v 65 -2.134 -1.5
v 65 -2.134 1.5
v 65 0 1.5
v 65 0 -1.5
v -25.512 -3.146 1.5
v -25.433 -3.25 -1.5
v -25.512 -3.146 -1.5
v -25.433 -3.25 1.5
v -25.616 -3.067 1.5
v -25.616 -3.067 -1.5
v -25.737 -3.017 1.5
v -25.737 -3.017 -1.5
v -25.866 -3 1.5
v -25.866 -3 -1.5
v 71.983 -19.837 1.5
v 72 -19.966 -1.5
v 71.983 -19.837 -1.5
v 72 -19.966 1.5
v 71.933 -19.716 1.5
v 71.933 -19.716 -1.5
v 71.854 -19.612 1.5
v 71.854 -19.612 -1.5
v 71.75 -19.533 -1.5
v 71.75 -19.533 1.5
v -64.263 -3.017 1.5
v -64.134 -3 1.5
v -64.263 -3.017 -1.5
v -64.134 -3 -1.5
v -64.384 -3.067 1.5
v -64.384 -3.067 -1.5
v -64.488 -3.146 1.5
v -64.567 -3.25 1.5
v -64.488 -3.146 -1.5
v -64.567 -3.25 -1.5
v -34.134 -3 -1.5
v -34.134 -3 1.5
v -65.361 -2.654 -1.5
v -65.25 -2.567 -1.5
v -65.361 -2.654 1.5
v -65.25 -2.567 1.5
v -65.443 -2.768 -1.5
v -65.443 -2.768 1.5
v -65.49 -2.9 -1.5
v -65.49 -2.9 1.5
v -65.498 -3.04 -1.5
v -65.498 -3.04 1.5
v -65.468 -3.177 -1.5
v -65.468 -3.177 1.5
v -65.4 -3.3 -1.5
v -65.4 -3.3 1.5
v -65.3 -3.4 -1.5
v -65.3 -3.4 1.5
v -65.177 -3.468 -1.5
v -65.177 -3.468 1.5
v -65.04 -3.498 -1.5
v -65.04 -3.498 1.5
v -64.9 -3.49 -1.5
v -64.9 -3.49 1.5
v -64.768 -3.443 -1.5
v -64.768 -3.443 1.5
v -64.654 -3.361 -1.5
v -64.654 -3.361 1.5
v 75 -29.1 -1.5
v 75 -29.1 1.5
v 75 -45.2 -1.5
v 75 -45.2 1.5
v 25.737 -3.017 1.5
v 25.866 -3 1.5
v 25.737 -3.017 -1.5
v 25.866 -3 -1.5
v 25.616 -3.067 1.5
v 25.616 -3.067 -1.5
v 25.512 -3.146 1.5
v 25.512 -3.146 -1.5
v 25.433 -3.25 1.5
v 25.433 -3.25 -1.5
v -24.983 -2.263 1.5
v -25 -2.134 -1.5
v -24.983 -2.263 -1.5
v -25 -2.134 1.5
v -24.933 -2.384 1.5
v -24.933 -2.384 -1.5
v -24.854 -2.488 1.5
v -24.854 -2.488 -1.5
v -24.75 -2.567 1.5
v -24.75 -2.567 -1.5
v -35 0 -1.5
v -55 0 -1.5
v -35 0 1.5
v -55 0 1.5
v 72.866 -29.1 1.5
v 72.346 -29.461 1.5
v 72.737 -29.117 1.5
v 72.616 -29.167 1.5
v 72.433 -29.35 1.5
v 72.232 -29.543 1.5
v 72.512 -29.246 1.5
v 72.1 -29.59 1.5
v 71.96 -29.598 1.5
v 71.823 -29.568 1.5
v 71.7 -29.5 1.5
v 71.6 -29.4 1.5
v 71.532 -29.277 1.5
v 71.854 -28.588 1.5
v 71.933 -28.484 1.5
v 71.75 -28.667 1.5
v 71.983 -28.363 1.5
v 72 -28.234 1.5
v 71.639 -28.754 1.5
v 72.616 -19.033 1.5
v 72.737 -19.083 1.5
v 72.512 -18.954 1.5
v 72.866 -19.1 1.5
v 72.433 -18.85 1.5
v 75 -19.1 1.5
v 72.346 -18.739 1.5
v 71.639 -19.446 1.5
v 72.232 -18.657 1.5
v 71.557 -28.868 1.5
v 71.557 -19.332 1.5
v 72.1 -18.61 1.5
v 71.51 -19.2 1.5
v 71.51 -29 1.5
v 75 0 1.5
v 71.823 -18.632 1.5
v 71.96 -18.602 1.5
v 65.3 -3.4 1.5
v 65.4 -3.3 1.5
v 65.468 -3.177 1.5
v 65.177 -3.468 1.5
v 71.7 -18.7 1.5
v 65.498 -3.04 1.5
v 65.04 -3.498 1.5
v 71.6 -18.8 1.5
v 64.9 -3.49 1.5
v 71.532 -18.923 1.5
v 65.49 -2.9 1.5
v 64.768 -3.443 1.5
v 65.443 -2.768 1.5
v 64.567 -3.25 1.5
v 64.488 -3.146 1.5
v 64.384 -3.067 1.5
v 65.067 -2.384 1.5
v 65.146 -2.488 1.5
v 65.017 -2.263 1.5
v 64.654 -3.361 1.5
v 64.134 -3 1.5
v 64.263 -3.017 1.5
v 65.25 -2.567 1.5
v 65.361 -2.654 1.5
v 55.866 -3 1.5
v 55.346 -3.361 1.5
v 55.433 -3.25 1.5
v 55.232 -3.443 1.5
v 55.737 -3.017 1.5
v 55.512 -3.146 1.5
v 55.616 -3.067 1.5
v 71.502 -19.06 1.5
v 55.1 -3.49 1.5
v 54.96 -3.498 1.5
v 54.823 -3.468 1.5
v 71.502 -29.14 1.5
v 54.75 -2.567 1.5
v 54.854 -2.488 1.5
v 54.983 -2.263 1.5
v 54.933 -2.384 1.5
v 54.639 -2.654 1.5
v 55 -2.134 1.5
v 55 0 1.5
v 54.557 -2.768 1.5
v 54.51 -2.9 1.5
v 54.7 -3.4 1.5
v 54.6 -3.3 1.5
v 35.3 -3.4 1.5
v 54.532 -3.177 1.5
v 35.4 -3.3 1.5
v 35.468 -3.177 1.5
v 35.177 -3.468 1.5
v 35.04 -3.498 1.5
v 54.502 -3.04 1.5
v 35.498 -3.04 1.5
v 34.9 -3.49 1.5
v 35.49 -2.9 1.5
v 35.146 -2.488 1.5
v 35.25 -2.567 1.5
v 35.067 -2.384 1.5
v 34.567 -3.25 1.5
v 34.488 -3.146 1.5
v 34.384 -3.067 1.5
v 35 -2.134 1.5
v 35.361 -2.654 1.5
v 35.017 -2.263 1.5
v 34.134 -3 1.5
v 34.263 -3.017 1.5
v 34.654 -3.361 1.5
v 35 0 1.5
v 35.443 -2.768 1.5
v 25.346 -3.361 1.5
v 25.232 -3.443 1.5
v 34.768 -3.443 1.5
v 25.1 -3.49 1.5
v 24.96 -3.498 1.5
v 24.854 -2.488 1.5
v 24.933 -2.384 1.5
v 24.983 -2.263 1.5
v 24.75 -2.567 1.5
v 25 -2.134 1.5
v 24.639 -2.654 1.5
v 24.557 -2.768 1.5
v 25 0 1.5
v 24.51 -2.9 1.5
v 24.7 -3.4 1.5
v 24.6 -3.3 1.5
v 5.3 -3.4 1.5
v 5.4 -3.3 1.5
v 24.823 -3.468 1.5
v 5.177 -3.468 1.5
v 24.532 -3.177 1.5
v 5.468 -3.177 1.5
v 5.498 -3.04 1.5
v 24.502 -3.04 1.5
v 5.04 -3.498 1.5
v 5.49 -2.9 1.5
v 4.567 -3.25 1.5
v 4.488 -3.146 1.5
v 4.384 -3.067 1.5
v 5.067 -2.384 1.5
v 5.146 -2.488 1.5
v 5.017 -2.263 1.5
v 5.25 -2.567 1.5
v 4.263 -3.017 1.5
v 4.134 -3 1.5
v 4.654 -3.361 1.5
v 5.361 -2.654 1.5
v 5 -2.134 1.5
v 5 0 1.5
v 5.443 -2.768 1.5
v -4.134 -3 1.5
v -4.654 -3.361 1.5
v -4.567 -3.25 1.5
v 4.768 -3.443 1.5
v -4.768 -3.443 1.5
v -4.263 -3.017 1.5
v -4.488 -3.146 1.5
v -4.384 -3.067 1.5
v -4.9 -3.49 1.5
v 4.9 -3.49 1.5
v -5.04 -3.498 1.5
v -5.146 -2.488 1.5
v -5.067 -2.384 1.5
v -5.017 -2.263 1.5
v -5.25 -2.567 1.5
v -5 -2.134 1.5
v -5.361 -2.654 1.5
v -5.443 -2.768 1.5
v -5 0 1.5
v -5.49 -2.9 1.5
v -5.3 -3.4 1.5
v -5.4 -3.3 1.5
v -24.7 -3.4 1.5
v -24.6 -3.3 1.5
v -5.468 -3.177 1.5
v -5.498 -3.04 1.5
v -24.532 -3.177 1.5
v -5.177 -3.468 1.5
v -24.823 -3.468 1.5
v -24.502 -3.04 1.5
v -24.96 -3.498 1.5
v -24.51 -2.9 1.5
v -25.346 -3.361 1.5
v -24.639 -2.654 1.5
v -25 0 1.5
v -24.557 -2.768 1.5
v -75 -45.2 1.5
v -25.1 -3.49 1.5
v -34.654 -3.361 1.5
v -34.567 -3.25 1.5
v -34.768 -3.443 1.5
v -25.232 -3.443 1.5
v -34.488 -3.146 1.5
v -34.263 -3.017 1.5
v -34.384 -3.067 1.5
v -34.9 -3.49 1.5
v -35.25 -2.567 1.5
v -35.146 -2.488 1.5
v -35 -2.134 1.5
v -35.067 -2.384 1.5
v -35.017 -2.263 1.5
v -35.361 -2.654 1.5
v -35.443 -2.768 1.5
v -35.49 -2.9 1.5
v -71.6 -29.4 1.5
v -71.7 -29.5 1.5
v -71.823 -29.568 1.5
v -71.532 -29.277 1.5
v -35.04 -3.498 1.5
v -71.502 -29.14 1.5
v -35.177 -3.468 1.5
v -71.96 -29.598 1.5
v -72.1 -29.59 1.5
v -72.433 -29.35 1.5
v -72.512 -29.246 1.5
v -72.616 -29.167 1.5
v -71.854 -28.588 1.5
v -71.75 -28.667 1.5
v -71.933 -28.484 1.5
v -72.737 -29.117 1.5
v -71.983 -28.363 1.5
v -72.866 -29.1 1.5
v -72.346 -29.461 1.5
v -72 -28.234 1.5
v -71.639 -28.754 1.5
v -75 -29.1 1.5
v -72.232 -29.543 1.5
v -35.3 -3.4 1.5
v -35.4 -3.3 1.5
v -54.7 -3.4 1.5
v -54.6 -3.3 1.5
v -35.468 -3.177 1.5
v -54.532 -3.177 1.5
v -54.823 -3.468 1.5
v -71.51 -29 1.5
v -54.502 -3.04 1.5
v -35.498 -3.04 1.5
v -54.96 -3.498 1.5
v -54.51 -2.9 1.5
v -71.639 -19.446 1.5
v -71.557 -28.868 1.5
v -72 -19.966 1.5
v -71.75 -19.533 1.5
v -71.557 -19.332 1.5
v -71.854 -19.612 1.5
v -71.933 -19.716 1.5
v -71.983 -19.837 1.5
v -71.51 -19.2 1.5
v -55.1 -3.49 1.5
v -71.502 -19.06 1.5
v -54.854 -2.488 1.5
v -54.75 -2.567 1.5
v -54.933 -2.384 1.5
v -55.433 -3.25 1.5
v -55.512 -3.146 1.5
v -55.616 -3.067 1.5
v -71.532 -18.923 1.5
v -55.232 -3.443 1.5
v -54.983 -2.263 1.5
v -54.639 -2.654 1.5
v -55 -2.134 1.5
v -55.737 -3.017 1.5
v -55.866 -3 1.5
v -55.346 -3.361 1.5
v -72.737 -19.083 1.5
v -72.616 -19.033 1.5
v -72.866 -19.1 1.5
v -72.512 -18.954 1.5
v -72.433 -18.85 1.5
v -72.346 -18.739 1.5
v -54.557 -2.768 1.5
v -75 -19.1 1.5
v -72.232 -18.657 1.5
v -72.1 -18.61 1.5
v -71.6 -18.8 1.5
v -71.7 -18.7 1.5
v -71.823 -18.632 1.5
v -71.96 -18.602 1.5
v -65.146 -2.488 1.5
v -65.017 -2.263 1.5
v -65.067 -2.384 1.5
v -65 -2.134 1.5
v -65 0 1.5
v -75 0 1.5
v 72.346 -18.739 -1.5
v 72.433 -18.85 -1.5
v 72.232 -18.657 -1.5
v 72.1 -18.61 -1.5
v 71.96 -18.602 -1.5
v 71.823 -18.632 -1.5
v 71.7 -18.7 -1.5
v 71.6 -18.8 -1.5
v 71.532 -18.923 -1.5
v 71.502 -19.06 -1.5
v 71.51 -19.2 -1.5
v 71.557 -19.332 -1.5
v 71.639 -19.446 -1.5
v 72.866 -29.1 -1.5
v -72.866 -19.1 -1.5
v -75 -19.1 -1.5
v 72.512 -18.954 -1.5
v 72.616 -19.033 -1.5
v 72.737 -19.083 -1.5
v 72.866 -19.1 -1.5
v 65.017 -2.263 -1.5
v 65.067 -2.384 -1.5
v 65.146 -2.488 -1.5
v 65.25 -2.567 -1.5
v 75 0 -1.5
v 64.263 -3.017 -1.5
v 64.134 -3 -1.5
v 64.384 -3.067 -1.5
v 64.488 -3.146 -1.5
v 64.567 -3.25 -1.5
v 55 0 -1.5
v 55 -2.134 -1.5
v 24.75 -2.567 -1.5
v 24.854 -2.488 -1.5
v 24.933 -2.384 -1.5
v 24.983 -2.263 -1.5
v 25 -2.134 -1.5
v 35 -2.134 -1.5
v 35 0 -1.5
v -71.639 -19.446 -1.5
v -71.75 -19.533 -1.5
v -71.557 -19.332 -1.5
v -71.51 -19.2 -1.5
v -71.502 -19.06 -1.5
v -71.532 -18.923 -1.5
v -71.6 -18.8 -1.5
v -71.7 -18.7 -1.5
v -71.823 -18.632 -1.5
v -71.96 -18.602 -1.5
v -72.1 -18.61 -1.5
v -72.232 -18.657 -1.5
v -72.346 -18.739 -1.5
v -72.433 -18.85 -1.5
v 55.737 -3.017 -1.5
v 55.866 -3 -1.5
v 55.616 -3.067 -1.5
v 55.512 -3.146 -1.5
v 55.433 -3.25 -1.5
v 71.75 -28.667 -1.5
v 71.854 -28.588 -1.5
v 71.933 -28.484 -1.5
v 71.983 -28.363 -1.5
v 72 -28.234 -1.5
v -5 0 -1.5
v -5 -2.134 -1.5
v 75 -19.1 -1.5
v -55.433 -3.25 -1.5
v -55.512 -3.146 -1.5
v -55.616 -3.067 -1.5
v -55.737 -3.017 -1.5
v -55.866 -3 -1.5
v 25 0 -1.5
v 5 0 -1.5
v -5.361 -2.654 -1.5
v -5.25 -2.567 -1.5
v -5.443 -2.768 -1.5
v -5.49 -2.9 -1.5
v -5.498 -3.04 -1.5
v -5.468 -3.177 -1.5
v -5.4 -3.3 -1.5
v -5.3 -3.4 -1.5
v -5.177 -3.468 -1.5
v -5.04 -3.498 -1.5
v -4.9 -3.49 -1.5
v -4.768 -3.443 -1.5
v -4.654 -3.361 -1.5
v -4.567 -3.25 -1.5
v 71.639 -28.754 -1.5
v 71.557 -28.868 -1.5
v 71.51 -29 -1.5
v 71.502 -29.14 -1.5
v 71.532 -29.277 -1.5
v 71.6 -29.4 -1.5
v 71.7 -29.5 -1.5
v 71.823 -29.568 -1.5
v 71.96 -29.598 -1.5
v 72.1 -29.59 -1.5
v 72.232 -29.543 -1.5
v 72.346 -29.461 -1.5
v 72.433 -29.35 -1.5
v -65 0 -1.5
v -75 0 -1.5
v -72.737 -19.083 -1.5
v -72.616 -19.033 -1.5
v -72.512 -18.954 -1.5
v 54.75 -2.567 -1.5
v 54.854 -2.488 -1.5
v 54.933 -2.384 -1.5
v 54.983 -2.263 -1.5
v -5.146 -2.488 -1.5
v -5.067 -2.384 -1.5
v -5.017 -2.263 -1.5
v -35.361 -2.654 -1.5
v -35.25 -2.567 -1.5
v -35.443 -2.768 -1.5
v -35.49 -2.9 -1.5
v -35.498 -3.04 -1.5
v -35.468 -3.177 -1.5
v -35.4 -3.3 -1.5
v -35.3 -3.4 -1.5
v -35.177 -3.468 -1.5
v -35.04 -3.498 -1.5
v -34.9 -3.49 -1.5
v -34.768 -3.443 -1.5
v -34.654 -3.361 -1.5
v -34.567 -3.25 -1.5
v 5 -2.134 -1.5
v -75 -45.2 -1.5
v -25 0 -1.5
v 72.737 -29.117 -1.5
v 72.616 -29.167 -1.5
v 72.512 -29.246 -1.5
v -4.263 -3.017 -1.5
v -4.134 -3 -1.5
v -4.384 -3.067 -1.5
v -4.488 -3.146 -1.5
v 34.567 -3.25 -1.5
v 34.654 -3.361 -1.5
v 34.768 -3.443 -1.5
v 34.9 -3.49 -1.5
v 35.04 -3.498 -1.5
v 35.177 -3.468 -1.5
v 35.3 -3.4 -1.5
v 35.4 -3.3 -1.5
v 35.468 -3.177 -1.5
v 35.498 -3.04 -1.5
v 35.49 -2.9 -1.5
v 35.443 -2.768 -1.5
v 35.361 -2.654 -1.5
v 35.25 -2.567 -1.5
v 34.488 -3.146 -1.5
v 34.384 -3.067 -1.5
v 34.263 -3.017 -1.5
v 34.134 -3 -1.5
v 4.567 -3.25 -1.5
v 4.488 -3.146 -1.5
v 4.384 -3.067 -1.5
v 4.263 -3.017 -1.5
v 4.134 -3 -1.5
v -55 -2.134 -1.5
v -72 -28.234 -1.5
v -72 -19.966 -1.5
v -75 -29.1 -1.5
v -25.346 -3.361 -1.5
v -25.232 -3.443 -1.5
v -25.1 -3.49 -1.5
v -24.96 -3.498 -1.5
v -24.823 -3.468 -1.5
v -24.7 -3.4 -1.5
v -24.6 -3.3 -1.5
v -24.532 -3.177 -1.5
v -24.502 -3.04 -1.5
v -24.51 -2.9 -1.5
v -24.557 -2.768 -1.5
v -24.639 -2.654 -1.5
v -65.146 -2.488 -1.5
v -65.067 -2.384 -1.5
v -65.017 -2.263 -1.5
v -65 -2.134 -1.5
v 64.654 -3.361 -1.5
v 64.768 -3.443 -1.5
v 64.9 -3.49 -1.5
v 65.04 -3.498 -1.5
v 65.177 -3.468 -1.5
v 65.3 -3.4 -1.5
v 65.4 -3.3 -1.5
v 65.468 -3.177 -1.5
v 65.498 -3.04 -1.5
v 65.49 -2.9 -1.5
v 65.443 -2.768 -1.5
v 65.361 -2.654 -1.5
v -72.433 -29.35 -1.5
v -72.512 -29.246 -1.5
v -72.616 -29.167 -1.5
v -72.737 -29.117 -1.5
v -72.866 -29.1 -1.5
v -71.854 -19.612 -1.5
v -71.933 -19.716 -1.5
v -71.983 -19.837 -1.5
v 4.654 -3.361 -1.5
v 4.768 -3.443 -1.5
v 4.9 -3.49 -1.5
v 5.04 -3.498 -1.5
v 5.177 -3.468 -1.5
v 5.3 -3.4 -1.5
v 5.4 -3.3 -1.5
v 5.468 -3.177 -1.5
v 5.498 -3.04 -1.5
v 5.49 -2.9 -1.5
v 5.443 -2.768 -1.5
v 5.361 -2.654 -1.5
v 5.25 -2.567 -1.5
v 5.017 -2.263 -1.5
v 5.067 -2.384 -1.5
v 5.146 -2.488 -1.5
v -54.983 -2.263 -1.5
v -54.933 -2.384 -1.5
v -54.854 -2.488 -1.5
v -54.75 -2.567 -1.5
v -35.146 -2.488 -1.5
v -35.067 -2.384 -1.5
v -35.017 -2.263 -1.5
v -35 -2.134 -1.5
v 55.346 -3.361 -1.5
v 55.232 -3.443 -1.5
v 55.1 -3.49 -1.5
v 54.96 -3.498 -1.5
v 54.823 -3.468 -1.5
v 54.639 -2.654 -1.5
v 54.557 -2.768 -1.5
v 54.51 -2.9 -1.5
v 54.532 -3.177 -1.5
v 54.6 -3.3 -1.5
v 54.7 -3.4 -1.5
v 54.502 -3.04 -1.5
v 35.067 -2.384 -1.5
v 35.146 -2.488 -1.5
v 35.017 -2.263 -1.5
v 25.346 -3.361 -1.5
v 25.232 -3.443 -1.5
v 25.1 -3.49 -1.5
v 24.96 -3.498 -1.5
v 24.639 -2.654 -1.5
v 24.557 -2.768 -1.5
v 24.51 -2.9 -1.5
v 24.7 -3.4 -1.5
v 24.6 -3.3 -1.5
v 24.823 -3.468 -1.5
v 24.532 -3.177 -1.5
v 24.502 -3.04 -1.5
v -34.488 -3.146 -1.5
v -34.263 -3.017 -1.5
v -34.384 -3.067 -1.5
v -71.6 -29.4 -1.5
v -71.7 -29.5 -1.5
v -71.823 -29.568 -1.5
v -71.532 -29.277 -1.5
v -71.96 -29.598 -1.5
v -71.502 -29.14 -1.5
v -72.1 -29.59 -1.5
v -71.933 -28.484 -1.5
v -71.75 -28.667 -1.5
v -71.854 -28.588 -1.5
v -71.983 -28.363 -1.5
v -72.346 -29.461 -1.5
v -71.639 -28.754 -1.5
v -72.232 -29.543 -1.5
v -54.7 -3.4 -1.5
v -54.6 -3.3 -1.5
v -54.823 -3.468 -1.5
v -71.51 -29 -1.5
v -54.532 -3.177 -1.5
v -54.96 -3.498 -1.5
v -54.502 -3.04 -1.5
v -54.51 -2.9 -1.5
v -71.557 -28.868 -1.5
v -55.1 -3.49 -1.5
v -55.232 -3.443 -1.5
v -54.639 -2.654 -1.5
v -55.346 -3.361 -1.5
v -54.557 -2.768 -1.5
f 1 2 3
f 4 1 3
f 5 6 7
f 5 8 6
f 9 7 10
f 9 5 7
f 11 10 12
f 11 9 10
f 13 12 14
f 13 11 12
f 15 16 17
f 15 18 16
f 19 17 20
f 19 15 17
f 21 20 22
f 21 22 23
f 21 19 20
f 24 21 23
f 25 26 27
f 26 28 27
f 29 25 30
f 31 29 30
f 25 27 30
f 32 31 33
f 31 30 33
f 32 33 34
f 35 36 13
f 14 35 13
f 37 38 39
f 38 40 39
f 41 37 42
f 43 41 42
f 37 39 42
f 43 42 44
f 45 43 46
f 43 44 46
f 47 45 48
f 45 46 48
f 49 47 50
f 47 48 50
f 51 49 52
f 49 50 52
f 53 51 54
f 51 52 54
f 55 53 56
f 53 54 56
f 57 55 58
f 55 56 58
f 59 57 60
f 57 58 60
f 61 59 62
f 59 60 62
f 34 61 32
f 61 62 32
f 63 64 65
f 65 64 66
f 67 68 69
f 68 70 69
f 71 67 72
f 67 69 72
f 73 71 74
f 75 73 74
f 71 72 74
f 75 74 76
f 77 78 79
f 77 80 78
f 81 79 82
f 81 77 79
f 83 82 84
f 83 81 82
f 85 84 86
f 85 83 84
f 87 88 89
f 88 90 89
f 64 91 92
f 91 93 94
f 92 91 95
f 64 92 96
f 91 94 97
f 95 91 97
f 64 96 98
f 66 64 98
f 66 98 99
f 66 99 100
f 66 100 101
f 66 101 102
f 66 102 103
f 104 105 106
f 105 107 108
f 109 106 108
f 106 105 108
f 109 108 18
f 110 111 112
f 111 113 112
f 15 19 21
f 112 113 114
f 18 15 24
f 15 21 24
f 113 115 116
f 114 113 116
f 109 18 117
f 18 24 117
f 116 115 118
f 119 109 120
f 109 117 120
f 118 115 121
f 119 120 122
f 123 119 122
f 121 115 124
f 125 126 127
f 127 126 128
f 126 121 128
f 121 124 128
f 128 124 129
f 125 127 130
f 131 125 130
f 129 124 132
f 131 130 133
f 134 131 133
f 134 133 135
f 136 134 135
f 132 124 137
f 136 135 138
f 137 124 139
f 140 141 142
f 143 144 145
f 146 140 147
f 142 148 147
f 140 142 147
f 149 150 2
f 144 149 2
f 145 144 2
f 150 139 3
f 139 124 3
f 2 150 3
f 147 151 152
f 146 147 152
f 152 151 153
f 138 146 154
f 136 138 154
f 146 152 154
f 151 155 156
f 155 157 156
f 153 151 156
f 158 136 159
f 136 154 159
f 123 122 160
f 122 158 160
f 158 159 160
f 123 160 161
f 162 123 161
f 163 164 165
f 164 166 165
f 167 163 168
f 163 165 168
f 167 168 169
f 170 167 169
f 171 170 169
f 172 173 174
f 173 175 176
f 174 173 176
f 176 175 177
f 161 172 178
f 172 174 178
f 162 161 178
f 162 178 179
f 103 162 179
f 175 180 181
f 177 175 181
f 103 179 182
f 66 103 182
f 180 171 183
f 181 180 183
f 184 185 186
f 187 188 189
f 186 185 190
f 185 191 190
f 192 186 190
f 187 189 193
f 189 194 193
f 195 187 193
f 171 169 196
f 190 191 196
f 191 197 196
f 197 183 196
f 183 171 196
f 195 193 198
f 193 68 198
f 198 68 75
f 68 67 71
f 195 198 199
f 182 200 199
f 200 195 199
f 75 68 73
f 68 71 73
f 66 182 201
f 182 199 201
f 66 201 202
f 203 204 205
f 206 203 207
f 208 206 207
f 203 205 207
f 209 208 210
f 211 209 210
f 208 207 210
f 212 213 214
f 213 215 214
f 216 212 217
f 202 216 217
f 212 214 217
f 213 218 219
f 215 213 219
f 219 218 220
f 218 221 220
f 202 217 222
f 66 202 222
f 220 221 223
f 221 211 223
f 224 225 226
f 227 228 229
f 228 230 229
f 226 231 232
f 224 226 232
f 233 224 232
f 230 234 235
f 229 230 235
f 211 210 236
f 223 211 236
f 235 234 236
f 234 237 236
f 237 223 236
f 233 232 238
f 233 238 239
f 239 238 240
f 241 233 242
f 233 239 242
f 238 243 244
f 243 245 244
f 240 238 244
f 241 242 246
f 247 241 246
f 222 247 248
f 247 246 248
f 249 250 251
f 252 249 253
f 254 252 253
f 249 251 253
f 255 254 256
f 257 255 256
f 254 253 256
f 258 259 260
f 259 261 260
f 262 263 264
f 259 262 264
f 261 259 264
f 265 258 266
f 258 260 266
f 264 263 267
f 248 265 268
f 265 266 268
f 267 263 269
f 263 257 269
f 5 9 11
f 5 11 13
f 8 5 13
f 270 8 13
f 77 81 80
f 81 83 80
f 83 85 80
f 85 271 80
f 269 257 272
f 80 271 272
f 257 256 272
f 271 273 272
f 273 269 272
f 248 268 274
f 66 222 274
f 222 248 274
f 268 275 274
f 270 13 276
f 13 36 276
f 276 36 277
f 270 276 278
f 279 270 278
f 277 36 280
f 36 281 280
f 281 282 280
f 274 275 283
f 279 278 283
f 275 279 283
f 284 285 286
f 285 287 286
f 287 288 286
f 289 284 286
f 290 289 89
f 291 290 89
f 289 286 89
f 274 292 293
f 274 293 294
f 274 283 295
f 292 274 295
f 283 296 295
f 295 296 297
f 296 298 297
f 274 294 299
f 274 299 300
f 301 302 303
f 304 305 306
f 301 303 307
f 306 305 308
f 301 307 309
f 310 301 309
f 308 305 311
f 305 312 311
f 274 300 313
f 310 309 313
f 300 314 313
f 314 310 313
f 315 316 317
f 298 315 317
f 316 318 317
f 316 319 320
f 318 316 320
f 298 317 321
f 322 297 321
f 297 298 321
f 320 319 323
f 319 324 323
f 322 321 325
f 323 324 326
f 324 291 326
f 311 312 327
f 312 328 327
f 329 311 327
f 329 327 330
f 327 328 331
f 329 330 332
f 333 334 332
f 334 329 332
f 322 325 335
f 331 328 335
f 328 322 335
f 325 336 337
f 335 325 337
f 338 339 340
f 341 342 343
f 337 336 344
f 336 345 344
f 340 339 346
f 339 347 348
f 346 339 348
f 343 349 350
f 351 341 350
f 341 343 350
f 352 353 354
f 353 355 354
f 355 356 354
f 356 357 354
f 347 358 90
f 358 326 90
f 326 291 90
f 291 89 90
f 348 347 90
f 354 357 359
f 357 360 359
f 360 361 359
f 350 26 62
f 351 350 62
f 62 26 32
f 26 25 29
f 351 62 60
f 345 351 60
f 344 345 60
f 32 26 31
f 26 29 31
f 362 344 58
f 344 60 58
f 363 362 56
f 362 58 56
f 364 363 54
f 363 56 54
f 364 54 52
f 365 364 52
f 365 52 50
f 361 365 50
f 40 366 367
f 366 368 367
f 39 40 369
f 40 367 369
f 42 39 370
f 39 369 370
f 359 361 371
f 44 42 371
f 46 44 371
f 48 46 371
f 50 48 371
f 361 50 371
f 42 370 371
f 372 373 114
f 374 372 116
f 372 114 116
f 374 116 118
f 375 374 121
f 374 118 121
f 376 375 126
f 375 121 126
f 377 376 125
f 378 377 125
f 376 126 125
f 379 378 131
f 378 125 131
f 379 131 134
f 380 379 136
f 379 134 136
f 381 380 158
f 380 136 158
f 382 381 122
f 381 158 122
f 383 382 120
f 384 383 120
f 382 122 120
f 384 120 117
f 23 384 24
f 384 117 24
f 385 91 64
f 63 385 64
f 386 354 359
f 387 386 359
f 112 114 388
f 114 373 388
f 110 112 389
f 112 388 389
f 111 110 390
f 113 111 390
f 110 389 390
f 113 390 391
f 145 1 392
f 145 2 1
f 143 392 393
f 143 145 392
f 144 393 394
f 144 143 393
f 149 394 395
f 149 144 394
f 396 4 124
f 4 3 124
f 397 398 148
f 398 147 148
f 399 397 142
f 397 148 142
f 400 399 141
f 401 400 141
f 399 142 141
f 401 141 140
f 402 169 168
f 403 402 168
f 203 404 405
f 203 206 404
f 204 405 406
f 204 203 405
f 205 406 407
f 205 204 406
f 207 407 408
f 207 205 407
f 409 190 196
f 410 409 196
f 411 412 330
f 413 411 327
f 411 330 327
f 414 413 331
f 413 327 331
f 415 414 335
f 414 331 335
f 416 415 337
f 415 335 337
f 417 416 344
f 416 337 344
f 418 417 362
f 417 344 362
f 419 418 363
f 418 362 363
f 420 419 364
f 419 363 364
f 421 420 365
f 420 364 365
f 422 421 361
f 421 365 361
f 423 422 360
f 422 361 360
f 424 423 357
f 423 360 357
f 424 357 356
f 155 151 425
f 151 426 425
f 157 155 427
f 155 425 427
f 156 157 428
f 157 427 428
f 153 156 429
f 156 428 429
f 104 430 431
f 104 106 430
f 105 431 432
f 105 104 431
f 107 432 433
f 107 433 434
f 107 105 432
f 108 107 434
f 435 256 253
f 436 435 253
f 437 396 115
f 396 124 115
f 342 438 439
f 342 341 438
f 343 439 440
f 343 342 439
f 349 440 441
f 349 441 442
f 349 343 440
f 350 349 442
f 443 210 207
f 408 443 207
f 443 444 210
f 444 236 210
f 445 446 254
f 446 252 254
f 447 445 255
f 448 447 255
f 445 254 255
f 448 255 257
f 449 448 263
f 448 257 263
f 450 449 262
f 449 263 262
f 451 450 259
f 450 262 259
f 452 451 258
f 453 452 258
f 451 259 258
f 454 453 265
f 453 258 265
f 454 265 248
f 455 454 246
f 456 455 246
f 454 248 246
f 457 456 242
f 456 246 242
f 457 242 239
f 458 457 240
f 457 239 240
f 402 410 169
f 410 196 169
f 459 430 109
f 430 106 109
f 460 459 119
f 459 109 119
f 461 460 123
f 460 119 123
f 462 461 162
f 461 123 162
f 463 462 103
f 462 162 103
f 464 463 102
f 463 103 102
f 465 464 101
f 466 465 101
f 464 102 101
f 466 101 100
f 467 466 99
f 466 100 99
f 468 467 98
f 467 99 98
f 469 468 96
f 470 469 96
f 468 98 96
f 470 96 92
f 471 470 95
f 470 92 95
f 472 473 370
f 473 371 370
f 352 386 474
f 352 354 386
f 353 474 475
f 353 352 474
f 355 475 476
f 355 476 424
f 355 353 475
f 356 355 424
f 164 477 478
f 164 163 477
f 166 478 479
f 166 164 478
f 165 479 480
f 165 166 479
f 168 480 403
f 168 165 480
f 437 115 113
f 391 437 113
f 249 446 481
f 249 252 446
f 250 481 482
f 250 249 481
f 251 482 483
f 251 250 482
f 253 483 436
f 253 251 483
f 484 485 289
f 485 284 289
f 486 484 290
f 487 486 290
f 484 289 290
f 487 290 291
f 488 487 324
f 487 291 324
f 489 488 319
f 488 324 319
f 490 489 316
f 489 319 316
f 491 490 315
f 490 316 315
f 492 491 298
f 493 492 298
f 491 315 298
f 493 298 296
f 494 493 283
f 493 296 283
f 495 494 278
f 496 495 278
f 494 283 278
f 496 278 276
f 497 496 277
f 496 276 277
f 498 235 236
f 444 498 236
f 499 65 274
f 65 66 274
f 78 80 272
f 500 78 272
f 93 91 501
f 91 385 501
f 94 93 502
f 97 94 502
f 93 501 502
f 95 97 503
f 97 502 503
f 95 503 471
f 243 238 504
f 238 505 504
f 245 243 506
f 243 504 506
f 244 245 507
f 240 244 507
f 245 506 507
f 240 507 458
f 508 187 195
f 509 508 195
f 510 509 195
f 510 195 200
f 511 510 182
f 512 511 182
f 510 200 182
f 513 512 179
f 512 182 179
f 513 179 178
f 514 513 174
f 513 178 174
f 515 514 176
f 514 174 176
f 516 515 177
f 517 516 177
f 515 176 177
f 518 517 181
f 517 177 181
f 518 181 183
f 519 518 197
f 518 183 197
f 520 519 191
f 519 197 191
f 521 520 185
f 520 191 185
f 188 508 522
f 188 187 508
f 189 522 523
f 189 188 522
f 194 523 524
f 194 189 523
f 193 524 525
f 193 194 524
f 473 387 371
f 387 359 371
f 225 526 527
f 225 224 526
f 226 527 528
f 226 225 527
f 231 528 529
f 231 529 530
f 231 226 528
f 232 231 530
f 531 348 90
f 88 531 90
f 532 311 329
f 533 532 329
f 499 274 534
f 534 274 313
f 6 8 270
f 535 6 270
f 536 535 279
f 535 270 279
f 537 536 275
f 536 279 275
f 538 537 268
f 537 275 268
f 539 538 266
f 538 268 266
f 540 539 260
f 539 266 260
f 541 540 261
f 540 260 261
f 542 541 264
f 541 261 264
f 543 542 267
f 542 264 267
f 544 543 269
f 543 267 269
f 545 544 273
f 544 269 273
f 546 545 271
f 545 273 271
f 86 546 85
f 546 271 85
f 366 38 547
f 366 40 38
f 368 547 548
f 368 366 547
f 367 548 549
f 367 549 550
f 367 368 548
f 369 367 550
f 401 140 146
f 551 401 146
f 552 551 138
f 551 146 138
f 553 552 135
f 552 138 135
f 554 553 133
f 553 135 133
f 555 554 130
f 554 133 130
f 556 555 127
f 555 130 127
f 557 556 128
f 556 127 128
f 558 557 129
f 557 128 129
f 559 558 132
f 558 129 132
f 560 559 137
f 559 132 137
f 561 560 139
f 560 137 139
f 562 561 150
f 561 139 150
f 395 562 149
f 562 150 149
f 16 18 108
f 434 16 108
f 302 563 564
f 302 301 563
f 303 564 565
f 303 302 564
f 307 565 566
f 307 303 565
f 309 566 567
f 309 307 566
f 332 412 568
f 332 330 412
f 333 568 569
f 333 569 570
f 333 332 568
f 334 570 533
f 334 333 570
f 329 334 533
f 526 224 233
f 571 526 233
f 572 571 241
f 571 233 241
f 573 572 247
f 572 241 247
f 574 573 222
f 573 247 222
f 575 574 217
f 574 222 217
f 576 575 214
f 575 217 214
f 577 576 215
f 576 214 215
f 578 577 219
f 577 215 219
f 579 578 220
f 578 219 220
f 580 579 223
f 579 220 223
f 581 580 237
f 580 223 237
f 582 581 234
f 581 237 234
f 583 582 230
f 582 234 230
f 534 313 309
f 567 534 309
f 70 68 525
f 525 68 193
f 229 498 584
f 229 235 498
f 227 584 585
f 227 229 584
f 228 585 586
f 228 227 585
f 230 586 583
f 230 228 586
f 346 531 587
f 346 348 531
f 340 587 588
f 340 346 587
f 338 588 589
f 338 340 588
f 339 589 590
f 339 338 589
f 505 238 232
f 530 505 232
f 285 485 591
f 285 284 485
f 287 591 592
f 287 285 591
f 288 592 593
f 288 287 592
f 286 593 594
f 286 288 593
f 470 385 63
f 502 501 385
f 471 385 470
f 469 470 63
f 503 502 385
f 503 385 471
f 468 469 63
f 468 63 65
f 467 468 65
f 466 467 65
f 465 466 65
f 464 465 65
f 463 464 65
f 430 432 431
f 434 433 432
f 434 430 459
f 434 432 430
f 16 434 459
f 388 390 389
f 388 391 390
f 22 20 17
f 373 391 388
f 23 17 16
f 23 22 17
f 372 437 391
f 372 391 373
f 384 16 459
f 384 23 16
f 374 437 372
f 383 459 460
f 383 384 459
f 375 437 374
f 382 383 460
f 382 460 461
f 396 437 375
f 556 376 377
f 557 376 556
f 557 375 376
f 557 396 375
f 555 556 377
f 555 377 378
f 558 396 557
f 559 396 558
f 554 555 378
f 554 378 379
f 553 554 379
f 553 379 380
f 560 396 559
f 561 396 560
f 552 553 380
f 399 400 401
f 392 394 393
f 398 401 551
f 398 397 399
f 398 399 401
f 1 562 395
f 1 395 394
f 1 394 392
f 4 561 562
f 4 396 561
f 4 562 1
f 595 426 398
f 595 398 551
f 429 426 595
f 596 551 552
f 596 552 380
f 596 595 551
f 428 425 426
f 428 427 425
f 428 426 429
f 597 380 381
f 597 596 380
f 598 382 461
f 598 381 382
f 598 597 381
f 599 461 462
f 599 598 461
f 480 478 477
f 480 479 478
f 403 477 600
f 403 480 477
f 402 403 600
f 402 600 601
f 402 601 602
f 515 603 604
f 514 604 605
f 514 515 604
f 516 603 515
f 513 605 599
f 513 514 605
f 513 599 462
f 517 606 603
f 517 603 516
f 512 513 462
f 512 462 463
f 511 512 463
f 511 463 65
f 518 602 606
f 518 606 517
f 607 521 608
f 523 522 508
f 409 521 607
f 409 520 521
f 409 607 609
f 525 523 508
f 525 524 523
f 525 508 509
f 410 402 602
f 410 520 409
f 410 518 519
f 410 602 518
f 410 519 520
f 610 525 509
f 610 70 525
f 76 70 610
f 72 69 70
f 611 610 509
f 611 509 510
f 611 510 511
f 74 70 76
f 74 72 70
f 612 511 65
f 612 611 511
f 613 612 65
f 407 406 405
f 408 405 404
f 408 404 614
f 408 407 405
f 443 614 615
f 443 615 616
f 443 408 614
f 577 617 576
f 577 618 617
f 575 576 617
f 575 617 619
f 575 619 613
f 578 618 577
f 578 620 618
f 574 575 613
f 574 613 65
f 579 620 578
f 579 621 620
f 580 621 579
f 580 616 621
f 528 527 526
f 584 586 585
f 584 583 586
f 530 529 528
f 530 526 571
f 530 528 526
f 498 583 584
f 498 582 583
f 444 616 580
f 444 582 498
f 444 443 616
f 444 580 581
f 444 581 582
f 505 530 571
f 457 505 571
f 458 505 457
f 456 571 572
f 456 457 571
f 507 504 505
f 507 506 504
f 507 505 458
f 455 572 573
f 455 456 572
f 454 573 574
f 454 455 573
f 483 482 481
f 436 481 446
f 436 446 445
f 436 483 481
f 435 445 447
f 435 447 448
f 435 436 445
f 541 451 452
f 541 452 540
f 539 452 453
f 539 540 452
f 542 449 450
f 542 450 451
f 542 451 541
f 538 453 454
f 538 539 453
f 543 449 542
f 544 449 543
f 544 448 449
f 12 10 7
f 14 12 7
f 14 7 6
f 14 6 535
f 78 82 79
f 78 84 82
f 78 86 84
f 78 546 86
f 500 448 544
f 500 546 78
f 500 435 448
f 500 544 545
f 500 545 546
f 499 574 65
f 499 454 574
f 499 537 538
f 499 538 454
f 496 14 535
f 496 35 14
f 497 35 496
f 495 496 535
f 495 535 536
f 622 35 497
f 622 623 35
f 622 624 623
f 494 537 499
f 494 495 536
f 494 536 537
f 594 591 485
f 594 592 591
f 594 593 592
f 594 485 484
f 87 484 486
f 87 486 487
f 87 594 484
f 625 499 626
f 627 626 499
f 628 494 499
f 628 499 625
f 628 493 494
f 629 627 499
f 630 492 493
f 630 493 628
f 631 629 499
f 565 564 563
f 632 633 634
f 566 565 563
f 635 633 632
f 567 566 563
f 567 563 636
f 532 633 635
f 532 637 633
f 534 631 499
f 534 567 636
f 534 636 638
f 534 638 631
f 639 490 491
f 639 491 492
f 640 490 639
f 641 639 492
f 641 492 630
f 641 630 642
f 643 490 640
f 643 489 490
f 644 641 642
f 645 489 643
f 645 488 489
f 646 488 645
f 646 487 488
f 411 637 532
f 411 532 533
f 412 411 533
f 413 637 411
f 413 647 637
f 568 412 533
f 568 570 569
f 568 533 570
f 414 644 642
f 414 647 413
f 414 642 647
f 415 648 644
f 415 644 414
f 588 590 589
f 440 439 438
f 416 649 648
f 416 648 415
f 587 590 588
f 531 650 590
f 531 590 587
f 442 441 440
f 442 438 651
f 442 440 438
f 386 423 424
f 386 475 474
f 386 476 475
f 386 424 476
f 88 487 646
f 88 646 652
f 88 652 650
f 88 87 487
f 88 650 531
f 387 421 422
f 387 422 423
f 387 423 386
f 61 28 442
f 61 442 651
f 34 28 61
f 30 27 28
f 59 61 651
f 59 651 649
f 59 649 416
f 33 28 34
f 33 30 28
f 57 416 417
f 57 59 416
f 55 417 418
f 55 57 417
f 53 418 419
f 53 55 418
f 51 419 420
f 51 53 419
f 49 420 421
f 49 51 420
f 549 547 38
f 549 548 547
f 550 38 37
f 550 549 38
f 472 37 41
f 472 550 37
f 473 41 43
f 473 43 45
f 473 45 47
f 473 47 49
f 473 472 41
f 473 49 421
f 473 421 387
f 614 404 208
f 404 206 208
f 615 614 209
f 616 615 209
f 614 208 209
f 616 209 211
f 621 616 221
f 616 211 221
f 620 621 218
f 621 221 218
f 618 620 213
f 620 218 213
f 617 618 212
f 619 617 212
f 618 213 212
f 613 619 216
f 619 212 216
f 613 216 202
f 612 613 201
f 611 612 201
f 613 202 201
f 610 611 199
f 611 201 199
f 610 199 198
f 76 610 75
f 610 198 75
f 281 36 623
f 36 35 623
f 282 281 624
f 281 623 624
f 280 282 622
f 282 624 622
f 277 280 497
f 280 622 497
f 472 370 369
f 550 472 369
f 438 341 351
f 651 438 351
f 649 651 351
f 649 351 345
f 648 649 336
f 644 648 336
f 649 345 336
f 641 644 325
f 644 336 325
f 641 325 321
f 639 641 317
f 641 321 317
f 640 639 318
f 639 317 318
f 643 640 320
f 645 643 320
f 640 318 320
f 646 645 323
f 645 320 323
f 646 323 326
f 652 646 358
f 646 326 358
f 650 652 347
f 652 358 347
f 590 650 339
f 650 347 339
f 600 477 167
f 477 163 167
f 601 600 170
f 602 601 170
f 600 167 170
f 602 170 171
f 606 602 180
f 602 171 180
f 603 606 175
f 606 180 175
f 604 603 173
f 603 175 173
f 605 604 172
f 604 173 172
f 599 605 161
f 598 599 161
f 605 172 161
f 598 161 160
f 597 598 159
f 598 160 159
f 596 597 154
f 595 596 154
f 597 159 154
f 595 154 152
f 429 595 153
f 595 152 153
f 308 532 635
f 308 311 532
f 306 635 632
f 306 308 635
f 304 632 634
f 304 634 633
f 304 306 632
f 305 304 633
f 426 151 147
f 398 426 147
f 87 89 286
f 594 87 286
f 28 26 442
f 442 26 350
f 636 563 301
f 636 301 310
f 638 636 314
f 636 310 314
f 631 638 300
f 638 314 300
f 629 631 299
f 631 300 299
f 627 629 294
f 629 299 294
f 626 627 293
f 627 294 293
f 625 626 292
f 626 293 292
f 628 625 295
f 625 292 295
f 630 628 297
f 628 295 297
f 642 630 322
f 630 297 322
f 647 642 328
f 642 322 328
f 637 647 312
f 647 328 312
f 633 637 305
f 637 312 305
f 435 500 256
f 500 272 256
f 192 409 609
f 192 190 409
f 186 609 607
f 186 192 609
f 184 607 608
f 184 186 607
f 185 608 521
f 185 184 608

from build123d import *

# Parameters (mm, degrees)
BOSS_EXTRUDE1_DEPTH = 1.5
SKETCH2_R           = 0.5
CUT_EXTRUDE1_DEPTH  = 88.618719461
FILLET1_R           = 0.5


with BuildPart() as part:
    # Sketch1 → Boss-Extrude1 (new, symmetric)
    with BuildSketch(Plane.XY):
        Polygon((65, -3), (65, 0), (75, 0), (75, -19.1), (72, -19.1), (72, -29.1), (75, -29.1), (75, -45.2), (-75, -45.2), (-75, -29.1), (-72, -29.1), (-72, -19.1), (-75, -19.1), (-75, 0), (-65, 0), (-65, -3), (-55, -3), (-55, 0), (-35, 0), (-35, -3), (-25, -3), (-25, 0), (-5, 0), (-5, -3), (5, -3), (5, 0), (25, 0), (25, -3), (35, -3), (35, 0), (55, 0), (55, -3), align=None)
    extrude(amount=BOSS_EXTRUDE1_DEPTH, both=True)

    # Sketch2 → Cut-Extrude1 (cut, through all)
    with BuildSketch(Plane.XY.offset(1.5)):
        with Locations((-72, -29.1)):
            Circle(SKETCH2_R)
        with Locations((-72, -19.1)):
            Circle(SKETCH2_R)
        with Locations((-65, -3)):
            Circle(SKETCH2_R)
        with Locations((-55, -3)):
            Circle(SKETCH2_R)
        with Locations((-35, -3)):
            Circle(SKETCH2_R)
        with Locations((-25, -3)):
            Circle(SKETCH2_R)
        with Locations((-5, -3)):
            Circle(SKETCH2_R)
        with Locations((5, -3)):
            Circle(SKETCH2_R)
        with Locations((25, -3)):
            Circle(SKETCH2_R)
        with Locations((35, -3)):
            Circle(SKETCH2_R)
        with Locations((55, -3)):
            Circle(SKETCH2_R)
        with Locations((65, -3)):
            Circle(SKETCH2_R)
        with Locations((72, -19.1)):
            Circle(SKETCH2_R)
        with Locations((72, -29.1)):
            Circle(SKETCH2_R)
    extrude(amount=-CUT_EXTRUDE1_DEPTH, mode=Mode.SUBTRACT)

    # Fillet1
    fillet1_edges = [part.edges().sort_by_distance(p)[0] for p in [
        (72.5, -29.1, 0),
        (72, -28.6, 0),
        (72, -19.6, 0),
        (72.5, -19.1, 0),
        (65, -2.5, 0),
        (64.5, -3, 0),
        (55.5, -3, 0),
        (55, -2.5, 0),
        (35, -2.5, 0),
        (34.5, -3, 0),
        (25.5, -3, 0),
        (25, -2.5, 0),
        (5, -2.5, 0),
        (4.5, -3, 0),
        (-4.5, -3, 0),
        (-5, -2.5, 0),
        (-25, -2.5, 0),
        (-25.5, -3, 0),
        (-34.5, -3, 0),
        (-35, -2.5, 0),
        (-55, -2.5, 0),
        (-55.5, -3, 0),
        (-64.5, -3, 0),
        (-65, -2.5, 0),
        (-72.5, -19.1, 0),
        (-72, -19.6, 0),
        (-72, -28.6, 0),
        (-72.5, -29.1, 0),
    ]]
    fillet(fillet1_edges, radius=FILLET1_R)


solid = part.part
